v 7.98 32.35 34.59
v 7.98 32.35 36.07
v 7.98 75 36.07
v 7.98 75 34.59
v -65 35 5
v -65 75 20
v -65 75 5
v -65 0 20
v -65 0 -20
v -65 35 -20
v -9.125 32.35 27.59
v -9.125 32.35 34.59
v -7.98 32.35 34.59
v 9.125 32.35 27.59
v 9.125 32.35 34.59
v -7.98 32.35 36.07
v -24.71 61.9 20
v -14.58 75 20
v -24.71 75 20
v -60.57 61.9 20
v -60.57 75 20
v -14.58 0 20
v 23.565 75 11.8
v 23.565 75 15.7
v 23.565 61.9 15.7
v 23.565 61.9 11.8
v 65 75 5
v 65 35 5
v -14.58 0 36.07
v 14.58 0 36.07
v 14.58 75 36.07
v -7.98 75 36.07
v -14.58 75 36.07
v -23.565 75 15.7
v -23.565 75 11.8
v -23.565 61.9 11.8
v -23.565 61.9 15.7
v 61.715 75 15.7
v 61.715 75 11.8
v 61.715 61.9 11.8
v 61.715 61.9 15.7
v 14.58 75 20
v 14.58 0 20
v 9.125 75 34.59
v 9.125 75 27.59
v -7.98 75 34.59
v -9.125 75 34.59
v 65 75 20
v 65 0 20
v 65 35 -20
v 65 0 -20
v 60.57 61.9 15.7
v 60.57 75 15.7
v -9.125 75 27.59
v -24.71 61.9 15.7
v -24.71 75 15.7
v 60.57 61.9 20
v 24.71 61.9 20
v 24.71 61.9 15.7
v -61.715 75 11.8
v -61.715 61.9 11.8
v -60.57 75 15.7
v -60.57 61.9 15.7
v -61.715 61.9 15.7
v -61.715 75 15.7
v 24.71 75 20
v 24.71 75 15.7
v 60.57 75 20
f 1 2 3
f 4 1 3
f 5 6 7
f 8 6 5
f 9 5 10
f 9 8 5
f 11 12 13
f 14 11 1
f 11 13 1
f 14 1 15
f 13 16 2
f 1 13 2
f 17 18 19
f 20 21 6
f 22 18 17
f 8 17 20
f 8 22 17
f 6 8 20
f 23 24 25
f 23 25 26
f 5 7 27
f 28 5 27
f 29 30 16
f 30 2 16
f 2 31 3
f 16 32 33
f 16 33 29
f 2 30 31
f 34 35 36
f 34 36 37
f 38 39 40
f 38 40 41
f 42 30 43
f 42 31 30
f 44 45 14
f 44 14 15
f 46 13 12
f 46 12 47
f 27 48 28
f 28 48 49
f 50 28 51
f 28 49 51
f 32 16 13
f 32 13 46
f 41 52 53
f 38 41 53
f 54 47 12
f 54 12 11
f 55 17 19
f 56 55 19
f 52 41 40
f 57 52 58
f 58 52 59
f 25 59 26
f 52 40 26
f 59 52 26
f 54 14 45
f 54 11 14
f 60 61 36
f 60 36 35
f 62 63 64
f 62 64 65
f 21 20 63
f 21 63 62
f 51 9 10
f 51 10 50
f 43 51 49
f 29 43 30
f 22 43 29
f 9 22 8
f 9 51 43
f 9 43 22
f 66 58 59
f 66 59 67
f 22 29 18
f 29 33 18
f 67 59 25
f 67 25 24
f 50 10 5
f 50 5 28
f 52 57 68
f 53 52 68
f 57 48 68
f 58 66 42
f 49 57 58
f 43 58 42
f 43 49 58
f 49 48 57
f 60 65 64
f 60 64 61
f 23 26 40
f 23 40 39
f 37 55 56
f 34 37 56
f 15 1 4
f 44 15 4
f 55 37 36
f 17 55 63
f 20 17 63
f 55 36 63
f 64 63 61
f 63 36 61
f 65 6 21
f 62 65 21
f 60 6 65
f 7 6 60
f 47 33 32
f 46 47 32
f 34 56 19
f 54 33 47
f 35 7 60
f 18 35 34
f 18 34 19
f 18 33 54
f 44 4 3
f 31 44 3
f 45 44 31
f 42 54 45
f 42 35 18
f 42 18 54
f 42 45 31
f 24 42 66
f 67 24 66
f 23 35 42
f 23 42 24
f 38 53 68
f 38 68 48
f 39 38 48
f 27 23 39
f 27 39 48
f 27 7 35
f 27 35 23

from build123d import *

# Parameters (mm, degrees)
SKETCH2_W           = 130
SKETCH2_H           = 40
BOSS_EXTRUDE1_DEPTH = 75
SKETCH6_W           = 29.16
SKETCH6_H           = 49.32
BOSS_EXTRUDE2_DEPTH = 16.07
SKETCH7_W           = 15.96
SKETCH7_H           = 42.65
CUT_EXTRUDE1_DEPTH  = 8.48
SKETCH8_W           = 7
SKETCH8_H           = 42.65
CUT_EXTRUDE2_DEPTH  = 1.145
SKETCH9_W           = 7
SKETCH9_H           = 42.65
CUT_EXTRUDE3_DEPTH  = 1.145
SKETCH11_W          = 35.86
SKETCH11_H          = 21.1
CUT_EXTRUDE4_DEPTH  = 8.2
SKETCH13_W          = 3.9
SKETCH13_H          = 21.1
CUT_EXTRUDE5_DEPTH  = 1.145
SKETCH14_W          = 3.9
SKETCH14_H          = 21.1
CUT_EXTRUDE6_DEPTH  = 1.145
SKETCH15_W          = 35.86
SKETCH15_H          = 21.1
CUT_EXTRUDE7_DEPTH  = 8.2
SKETCH16_W          = 3.9
SKETCH16_H          = 21.1
CUT_EXTRUDE8_DEPTH  = 1.145
SKETCH17_W          = 3.9
SKETCH17_H          = 21.1
CUT_EXTRUDE9_DEPTH  = 1.145
SKETCH20_W          = 29.16
SKETCH20_H          = 16.07
BOSS_EXTRUDE3_DEPTH = 25.68
SKETCH21_W          = 40
SKETCH21_H          = 25
CUT_EXTRUDE10_DEPTH = 40
SKETCH22_W          = 50
SKETCH22_H          = 25
CUT_EXTRUDE11_DEPTH = 40
BOSS_EXTRUDE4_DEPTH = 8
BOSS_EXTRUDE5_DEPTH = 8


with BuildPart() as part:
    # Sketch2 → Boss-Extrude1 (new body)
    with BuildSketch(Plane(origin=(0, 0, 0), x_dir=(1, 0, 0), z_dir=(0, 1, 0))):
        Rectangle(SKETCH2_W, SKETCH2_H)
    extrude(amount=BOSS_EXTRUDE1_DEPTH)

    # Sketch6 → Boss-Extrude2 (add)
    with BuildSketch(Plane.XY.offset(20)):
        with Locations((0, 50.34)):
            Rectangle(SKETCH6_W, SKETCH6_H)
    extrude(amount=BOSS_EXTRUDE2_DEPTH)

    # Sketch7 → Cut-Extrude1 (cut)
    with BuildSketch(Plane.XY.offset(36.07)):
        with Locations((0, 53.675)):
            Rectangle(SKETCH7_W, SKETCH7_H)
    extrude(amount=-CUT_EXTRUDE1_DEPTH, mode=Mode.SUBTRACT)

    # Sketch8 → Cut-Extrude2 (cut)
    with BuildSketch(Plane(origin=(-7.98, 0, 0), x_dir=(0, 0, -1), z_dir=(1, 0, 0))):
        with Locations((-31.09, 53.675)):
            Rectangle(SKETCH8_W, SKETCH8_H)
    extrude(amount=-CUT_EXTRUDE2_DEPTH, mode=Mode.SUBTRACT)

    # Sketch9 → Cut-Extrude3 (cut)
    with BuildSketch(Plane.ZY.offset(-7.98)):
        with Locations((31.09, 53.675)):
            Rectangle(SKETCH9_W, SKETCH9_H)
    extrude(amount=-CUT_EXTRUDE3_DEPTH, mode=Mode.SUBTRACT)

    # Sketch11 → Cut-Extrude4 (cut)
    with BuildSketch(Plane.XY.offset(20)):
        with Locations((42.64, 64.45)):
            Rectangle(SKETCH11_W, SKETCH11_H)
    extrude(amount=-CUT_EXTRUDE4_DEPTH, mode=Mode.SUBTRACT)

    # Sketch13 → Cut-Extrude5 (cut)
    with BuildSketch(Plane(origin=(24.71, 0, 0), x_dir=(0, 0, -1), z_dir=(1, 0, 0))):
        with Locations((-13.75, 64.45)):
            Rectangle(SKETCH13_W, SKETCH13_H)
    extrude(amount=-CUT_EXTRUDE5_DEPTH, mode=Mode.SUBTRACT)

    # Sketch14 → Cut-Extrude6 (cut)
    with BuildSketch(Plane.ZY.offset(-60.57)):
        with Locations((13.75, 64.45)):
            Rectangle(SKETCH14_W, SKETCH14_H)
    extrude(amount=-CUT_EXTRUDE6_DEPTH, mode=Mode.SUBTRACT)

    # Sketch15 → Cut-Extrude7 (cut)
    with BuildSketch(Plane.XY.offset(20)):
        with Locations((-42.64, 64.45)):
            Rectangle(SKETCH15_W, SKETCH15_H)
    extrude(amount=-CUT_EXTRUDE7_DEPTH, mode=Mode.SUBTRACT)

    # Sketch16 → Cut-Extrude8 (cut)
    with BuildSketch(Plane(origin=(-60.57, 0, 0), x_dir=(0, 0, -1), z_dir=(1, 0, 0))):
        with Locations((-13.75, 64.45)):
            Rectangle(SKETCH16_W, SKETCH16_H)
    extrude(amount=-CUT_EXTRUDE8_DEPTH, mode=Mode.SUBTRACT)

    # Sketch17 → Cut-Extrude9 (cut)
    with BuildSketch(Plane.ZY.offset(24.71)):
        with Locations((13.75, 64.45)):
            Rectangle(SKETCH17_W, SKETCH17_H)
    extrude(amount=-CUT_EXTRUDE9_DEPTH, mode=Mode.SUBTRACT)

    # Sketch20 → Boss-Extrude3 (add)
    with BuildSketch(Plane(origin=(0, 25.68, 0), x_dir=(-1, 0, 0), z_dir=(0, -1, 0))):
        with Locations((0, -28.035)):
            Rectangle(SKETCH20_W, SKETCH20_H)
    extrude(amount=BOSS_EXTRUDE3_DEPTH)

    # Sketch21 → Cut-Extrude10 (cut)
    with BuildSketch(Plane(origin=(0, 75, 0), x_dir=(1, 0, 0), z_dir=(0, 1, 0))):
        with Locations((45, 7.5)):
            Rectangle(SKETCH21_W, SKETCH21_H)
        with Locations((-45, 7.5)):
            Rectangle(SKETCH21_W, SKETCH21_H)
    extrude(amount=-CUT_EXTRUDE10_DEPTH, mode=Mode.SUBTRACT)

    # Sketch22 → Cut-Extrude11 (cut)
    with BuildSketch(Plane(origin=(0, 75, 0), x_dir=(1, 0, 0), z_dir=(0, 1, 0))):
        with Locations((0, 7.5)):
            Rectangle(SKETCH22_W, SKETCH22_H)
    extrude(amount=-CUT_EXTRUDE11_DEPTH, mode=Mode.SUBTRACT)

    # Sketch23 → Boss-Extrude4 (add)
    with BuildSketch(Plane(origin=(0, 53.9, 0), x_dir=(1, 0, 0), z_dir=(0, 1, 0))):
        Polygon((-60.57, -20), (-60.57, -15.7), (-61.715, -15.7), (-61.715, -11.8), (-23.565, -11.8), (-23.565, -15.7), (-24.71, -15.7), (-24.71, -20), align=None)
    extrude(amount=BOSS_EXTRUDE4_DEPTH)

    # Sketch24 → Boss-Extrude5 (add)
    with BuildSketch(Plane(origin=(0, 53.9, 0), x_dir=(1, 0, 0), z_dir=(0, 1, 0))):
        Polygon((24.71, -20), (24.71, -15.7), (23.565, -15.7), (23.565, -11.8), (61.715, -11.8), (61.715, -15.7), (60.57, -15.7), (60.57, -20), align=None)
    extrude(amount=BOSS_EXTRUDE5_DEPTH)


solid = part.part
